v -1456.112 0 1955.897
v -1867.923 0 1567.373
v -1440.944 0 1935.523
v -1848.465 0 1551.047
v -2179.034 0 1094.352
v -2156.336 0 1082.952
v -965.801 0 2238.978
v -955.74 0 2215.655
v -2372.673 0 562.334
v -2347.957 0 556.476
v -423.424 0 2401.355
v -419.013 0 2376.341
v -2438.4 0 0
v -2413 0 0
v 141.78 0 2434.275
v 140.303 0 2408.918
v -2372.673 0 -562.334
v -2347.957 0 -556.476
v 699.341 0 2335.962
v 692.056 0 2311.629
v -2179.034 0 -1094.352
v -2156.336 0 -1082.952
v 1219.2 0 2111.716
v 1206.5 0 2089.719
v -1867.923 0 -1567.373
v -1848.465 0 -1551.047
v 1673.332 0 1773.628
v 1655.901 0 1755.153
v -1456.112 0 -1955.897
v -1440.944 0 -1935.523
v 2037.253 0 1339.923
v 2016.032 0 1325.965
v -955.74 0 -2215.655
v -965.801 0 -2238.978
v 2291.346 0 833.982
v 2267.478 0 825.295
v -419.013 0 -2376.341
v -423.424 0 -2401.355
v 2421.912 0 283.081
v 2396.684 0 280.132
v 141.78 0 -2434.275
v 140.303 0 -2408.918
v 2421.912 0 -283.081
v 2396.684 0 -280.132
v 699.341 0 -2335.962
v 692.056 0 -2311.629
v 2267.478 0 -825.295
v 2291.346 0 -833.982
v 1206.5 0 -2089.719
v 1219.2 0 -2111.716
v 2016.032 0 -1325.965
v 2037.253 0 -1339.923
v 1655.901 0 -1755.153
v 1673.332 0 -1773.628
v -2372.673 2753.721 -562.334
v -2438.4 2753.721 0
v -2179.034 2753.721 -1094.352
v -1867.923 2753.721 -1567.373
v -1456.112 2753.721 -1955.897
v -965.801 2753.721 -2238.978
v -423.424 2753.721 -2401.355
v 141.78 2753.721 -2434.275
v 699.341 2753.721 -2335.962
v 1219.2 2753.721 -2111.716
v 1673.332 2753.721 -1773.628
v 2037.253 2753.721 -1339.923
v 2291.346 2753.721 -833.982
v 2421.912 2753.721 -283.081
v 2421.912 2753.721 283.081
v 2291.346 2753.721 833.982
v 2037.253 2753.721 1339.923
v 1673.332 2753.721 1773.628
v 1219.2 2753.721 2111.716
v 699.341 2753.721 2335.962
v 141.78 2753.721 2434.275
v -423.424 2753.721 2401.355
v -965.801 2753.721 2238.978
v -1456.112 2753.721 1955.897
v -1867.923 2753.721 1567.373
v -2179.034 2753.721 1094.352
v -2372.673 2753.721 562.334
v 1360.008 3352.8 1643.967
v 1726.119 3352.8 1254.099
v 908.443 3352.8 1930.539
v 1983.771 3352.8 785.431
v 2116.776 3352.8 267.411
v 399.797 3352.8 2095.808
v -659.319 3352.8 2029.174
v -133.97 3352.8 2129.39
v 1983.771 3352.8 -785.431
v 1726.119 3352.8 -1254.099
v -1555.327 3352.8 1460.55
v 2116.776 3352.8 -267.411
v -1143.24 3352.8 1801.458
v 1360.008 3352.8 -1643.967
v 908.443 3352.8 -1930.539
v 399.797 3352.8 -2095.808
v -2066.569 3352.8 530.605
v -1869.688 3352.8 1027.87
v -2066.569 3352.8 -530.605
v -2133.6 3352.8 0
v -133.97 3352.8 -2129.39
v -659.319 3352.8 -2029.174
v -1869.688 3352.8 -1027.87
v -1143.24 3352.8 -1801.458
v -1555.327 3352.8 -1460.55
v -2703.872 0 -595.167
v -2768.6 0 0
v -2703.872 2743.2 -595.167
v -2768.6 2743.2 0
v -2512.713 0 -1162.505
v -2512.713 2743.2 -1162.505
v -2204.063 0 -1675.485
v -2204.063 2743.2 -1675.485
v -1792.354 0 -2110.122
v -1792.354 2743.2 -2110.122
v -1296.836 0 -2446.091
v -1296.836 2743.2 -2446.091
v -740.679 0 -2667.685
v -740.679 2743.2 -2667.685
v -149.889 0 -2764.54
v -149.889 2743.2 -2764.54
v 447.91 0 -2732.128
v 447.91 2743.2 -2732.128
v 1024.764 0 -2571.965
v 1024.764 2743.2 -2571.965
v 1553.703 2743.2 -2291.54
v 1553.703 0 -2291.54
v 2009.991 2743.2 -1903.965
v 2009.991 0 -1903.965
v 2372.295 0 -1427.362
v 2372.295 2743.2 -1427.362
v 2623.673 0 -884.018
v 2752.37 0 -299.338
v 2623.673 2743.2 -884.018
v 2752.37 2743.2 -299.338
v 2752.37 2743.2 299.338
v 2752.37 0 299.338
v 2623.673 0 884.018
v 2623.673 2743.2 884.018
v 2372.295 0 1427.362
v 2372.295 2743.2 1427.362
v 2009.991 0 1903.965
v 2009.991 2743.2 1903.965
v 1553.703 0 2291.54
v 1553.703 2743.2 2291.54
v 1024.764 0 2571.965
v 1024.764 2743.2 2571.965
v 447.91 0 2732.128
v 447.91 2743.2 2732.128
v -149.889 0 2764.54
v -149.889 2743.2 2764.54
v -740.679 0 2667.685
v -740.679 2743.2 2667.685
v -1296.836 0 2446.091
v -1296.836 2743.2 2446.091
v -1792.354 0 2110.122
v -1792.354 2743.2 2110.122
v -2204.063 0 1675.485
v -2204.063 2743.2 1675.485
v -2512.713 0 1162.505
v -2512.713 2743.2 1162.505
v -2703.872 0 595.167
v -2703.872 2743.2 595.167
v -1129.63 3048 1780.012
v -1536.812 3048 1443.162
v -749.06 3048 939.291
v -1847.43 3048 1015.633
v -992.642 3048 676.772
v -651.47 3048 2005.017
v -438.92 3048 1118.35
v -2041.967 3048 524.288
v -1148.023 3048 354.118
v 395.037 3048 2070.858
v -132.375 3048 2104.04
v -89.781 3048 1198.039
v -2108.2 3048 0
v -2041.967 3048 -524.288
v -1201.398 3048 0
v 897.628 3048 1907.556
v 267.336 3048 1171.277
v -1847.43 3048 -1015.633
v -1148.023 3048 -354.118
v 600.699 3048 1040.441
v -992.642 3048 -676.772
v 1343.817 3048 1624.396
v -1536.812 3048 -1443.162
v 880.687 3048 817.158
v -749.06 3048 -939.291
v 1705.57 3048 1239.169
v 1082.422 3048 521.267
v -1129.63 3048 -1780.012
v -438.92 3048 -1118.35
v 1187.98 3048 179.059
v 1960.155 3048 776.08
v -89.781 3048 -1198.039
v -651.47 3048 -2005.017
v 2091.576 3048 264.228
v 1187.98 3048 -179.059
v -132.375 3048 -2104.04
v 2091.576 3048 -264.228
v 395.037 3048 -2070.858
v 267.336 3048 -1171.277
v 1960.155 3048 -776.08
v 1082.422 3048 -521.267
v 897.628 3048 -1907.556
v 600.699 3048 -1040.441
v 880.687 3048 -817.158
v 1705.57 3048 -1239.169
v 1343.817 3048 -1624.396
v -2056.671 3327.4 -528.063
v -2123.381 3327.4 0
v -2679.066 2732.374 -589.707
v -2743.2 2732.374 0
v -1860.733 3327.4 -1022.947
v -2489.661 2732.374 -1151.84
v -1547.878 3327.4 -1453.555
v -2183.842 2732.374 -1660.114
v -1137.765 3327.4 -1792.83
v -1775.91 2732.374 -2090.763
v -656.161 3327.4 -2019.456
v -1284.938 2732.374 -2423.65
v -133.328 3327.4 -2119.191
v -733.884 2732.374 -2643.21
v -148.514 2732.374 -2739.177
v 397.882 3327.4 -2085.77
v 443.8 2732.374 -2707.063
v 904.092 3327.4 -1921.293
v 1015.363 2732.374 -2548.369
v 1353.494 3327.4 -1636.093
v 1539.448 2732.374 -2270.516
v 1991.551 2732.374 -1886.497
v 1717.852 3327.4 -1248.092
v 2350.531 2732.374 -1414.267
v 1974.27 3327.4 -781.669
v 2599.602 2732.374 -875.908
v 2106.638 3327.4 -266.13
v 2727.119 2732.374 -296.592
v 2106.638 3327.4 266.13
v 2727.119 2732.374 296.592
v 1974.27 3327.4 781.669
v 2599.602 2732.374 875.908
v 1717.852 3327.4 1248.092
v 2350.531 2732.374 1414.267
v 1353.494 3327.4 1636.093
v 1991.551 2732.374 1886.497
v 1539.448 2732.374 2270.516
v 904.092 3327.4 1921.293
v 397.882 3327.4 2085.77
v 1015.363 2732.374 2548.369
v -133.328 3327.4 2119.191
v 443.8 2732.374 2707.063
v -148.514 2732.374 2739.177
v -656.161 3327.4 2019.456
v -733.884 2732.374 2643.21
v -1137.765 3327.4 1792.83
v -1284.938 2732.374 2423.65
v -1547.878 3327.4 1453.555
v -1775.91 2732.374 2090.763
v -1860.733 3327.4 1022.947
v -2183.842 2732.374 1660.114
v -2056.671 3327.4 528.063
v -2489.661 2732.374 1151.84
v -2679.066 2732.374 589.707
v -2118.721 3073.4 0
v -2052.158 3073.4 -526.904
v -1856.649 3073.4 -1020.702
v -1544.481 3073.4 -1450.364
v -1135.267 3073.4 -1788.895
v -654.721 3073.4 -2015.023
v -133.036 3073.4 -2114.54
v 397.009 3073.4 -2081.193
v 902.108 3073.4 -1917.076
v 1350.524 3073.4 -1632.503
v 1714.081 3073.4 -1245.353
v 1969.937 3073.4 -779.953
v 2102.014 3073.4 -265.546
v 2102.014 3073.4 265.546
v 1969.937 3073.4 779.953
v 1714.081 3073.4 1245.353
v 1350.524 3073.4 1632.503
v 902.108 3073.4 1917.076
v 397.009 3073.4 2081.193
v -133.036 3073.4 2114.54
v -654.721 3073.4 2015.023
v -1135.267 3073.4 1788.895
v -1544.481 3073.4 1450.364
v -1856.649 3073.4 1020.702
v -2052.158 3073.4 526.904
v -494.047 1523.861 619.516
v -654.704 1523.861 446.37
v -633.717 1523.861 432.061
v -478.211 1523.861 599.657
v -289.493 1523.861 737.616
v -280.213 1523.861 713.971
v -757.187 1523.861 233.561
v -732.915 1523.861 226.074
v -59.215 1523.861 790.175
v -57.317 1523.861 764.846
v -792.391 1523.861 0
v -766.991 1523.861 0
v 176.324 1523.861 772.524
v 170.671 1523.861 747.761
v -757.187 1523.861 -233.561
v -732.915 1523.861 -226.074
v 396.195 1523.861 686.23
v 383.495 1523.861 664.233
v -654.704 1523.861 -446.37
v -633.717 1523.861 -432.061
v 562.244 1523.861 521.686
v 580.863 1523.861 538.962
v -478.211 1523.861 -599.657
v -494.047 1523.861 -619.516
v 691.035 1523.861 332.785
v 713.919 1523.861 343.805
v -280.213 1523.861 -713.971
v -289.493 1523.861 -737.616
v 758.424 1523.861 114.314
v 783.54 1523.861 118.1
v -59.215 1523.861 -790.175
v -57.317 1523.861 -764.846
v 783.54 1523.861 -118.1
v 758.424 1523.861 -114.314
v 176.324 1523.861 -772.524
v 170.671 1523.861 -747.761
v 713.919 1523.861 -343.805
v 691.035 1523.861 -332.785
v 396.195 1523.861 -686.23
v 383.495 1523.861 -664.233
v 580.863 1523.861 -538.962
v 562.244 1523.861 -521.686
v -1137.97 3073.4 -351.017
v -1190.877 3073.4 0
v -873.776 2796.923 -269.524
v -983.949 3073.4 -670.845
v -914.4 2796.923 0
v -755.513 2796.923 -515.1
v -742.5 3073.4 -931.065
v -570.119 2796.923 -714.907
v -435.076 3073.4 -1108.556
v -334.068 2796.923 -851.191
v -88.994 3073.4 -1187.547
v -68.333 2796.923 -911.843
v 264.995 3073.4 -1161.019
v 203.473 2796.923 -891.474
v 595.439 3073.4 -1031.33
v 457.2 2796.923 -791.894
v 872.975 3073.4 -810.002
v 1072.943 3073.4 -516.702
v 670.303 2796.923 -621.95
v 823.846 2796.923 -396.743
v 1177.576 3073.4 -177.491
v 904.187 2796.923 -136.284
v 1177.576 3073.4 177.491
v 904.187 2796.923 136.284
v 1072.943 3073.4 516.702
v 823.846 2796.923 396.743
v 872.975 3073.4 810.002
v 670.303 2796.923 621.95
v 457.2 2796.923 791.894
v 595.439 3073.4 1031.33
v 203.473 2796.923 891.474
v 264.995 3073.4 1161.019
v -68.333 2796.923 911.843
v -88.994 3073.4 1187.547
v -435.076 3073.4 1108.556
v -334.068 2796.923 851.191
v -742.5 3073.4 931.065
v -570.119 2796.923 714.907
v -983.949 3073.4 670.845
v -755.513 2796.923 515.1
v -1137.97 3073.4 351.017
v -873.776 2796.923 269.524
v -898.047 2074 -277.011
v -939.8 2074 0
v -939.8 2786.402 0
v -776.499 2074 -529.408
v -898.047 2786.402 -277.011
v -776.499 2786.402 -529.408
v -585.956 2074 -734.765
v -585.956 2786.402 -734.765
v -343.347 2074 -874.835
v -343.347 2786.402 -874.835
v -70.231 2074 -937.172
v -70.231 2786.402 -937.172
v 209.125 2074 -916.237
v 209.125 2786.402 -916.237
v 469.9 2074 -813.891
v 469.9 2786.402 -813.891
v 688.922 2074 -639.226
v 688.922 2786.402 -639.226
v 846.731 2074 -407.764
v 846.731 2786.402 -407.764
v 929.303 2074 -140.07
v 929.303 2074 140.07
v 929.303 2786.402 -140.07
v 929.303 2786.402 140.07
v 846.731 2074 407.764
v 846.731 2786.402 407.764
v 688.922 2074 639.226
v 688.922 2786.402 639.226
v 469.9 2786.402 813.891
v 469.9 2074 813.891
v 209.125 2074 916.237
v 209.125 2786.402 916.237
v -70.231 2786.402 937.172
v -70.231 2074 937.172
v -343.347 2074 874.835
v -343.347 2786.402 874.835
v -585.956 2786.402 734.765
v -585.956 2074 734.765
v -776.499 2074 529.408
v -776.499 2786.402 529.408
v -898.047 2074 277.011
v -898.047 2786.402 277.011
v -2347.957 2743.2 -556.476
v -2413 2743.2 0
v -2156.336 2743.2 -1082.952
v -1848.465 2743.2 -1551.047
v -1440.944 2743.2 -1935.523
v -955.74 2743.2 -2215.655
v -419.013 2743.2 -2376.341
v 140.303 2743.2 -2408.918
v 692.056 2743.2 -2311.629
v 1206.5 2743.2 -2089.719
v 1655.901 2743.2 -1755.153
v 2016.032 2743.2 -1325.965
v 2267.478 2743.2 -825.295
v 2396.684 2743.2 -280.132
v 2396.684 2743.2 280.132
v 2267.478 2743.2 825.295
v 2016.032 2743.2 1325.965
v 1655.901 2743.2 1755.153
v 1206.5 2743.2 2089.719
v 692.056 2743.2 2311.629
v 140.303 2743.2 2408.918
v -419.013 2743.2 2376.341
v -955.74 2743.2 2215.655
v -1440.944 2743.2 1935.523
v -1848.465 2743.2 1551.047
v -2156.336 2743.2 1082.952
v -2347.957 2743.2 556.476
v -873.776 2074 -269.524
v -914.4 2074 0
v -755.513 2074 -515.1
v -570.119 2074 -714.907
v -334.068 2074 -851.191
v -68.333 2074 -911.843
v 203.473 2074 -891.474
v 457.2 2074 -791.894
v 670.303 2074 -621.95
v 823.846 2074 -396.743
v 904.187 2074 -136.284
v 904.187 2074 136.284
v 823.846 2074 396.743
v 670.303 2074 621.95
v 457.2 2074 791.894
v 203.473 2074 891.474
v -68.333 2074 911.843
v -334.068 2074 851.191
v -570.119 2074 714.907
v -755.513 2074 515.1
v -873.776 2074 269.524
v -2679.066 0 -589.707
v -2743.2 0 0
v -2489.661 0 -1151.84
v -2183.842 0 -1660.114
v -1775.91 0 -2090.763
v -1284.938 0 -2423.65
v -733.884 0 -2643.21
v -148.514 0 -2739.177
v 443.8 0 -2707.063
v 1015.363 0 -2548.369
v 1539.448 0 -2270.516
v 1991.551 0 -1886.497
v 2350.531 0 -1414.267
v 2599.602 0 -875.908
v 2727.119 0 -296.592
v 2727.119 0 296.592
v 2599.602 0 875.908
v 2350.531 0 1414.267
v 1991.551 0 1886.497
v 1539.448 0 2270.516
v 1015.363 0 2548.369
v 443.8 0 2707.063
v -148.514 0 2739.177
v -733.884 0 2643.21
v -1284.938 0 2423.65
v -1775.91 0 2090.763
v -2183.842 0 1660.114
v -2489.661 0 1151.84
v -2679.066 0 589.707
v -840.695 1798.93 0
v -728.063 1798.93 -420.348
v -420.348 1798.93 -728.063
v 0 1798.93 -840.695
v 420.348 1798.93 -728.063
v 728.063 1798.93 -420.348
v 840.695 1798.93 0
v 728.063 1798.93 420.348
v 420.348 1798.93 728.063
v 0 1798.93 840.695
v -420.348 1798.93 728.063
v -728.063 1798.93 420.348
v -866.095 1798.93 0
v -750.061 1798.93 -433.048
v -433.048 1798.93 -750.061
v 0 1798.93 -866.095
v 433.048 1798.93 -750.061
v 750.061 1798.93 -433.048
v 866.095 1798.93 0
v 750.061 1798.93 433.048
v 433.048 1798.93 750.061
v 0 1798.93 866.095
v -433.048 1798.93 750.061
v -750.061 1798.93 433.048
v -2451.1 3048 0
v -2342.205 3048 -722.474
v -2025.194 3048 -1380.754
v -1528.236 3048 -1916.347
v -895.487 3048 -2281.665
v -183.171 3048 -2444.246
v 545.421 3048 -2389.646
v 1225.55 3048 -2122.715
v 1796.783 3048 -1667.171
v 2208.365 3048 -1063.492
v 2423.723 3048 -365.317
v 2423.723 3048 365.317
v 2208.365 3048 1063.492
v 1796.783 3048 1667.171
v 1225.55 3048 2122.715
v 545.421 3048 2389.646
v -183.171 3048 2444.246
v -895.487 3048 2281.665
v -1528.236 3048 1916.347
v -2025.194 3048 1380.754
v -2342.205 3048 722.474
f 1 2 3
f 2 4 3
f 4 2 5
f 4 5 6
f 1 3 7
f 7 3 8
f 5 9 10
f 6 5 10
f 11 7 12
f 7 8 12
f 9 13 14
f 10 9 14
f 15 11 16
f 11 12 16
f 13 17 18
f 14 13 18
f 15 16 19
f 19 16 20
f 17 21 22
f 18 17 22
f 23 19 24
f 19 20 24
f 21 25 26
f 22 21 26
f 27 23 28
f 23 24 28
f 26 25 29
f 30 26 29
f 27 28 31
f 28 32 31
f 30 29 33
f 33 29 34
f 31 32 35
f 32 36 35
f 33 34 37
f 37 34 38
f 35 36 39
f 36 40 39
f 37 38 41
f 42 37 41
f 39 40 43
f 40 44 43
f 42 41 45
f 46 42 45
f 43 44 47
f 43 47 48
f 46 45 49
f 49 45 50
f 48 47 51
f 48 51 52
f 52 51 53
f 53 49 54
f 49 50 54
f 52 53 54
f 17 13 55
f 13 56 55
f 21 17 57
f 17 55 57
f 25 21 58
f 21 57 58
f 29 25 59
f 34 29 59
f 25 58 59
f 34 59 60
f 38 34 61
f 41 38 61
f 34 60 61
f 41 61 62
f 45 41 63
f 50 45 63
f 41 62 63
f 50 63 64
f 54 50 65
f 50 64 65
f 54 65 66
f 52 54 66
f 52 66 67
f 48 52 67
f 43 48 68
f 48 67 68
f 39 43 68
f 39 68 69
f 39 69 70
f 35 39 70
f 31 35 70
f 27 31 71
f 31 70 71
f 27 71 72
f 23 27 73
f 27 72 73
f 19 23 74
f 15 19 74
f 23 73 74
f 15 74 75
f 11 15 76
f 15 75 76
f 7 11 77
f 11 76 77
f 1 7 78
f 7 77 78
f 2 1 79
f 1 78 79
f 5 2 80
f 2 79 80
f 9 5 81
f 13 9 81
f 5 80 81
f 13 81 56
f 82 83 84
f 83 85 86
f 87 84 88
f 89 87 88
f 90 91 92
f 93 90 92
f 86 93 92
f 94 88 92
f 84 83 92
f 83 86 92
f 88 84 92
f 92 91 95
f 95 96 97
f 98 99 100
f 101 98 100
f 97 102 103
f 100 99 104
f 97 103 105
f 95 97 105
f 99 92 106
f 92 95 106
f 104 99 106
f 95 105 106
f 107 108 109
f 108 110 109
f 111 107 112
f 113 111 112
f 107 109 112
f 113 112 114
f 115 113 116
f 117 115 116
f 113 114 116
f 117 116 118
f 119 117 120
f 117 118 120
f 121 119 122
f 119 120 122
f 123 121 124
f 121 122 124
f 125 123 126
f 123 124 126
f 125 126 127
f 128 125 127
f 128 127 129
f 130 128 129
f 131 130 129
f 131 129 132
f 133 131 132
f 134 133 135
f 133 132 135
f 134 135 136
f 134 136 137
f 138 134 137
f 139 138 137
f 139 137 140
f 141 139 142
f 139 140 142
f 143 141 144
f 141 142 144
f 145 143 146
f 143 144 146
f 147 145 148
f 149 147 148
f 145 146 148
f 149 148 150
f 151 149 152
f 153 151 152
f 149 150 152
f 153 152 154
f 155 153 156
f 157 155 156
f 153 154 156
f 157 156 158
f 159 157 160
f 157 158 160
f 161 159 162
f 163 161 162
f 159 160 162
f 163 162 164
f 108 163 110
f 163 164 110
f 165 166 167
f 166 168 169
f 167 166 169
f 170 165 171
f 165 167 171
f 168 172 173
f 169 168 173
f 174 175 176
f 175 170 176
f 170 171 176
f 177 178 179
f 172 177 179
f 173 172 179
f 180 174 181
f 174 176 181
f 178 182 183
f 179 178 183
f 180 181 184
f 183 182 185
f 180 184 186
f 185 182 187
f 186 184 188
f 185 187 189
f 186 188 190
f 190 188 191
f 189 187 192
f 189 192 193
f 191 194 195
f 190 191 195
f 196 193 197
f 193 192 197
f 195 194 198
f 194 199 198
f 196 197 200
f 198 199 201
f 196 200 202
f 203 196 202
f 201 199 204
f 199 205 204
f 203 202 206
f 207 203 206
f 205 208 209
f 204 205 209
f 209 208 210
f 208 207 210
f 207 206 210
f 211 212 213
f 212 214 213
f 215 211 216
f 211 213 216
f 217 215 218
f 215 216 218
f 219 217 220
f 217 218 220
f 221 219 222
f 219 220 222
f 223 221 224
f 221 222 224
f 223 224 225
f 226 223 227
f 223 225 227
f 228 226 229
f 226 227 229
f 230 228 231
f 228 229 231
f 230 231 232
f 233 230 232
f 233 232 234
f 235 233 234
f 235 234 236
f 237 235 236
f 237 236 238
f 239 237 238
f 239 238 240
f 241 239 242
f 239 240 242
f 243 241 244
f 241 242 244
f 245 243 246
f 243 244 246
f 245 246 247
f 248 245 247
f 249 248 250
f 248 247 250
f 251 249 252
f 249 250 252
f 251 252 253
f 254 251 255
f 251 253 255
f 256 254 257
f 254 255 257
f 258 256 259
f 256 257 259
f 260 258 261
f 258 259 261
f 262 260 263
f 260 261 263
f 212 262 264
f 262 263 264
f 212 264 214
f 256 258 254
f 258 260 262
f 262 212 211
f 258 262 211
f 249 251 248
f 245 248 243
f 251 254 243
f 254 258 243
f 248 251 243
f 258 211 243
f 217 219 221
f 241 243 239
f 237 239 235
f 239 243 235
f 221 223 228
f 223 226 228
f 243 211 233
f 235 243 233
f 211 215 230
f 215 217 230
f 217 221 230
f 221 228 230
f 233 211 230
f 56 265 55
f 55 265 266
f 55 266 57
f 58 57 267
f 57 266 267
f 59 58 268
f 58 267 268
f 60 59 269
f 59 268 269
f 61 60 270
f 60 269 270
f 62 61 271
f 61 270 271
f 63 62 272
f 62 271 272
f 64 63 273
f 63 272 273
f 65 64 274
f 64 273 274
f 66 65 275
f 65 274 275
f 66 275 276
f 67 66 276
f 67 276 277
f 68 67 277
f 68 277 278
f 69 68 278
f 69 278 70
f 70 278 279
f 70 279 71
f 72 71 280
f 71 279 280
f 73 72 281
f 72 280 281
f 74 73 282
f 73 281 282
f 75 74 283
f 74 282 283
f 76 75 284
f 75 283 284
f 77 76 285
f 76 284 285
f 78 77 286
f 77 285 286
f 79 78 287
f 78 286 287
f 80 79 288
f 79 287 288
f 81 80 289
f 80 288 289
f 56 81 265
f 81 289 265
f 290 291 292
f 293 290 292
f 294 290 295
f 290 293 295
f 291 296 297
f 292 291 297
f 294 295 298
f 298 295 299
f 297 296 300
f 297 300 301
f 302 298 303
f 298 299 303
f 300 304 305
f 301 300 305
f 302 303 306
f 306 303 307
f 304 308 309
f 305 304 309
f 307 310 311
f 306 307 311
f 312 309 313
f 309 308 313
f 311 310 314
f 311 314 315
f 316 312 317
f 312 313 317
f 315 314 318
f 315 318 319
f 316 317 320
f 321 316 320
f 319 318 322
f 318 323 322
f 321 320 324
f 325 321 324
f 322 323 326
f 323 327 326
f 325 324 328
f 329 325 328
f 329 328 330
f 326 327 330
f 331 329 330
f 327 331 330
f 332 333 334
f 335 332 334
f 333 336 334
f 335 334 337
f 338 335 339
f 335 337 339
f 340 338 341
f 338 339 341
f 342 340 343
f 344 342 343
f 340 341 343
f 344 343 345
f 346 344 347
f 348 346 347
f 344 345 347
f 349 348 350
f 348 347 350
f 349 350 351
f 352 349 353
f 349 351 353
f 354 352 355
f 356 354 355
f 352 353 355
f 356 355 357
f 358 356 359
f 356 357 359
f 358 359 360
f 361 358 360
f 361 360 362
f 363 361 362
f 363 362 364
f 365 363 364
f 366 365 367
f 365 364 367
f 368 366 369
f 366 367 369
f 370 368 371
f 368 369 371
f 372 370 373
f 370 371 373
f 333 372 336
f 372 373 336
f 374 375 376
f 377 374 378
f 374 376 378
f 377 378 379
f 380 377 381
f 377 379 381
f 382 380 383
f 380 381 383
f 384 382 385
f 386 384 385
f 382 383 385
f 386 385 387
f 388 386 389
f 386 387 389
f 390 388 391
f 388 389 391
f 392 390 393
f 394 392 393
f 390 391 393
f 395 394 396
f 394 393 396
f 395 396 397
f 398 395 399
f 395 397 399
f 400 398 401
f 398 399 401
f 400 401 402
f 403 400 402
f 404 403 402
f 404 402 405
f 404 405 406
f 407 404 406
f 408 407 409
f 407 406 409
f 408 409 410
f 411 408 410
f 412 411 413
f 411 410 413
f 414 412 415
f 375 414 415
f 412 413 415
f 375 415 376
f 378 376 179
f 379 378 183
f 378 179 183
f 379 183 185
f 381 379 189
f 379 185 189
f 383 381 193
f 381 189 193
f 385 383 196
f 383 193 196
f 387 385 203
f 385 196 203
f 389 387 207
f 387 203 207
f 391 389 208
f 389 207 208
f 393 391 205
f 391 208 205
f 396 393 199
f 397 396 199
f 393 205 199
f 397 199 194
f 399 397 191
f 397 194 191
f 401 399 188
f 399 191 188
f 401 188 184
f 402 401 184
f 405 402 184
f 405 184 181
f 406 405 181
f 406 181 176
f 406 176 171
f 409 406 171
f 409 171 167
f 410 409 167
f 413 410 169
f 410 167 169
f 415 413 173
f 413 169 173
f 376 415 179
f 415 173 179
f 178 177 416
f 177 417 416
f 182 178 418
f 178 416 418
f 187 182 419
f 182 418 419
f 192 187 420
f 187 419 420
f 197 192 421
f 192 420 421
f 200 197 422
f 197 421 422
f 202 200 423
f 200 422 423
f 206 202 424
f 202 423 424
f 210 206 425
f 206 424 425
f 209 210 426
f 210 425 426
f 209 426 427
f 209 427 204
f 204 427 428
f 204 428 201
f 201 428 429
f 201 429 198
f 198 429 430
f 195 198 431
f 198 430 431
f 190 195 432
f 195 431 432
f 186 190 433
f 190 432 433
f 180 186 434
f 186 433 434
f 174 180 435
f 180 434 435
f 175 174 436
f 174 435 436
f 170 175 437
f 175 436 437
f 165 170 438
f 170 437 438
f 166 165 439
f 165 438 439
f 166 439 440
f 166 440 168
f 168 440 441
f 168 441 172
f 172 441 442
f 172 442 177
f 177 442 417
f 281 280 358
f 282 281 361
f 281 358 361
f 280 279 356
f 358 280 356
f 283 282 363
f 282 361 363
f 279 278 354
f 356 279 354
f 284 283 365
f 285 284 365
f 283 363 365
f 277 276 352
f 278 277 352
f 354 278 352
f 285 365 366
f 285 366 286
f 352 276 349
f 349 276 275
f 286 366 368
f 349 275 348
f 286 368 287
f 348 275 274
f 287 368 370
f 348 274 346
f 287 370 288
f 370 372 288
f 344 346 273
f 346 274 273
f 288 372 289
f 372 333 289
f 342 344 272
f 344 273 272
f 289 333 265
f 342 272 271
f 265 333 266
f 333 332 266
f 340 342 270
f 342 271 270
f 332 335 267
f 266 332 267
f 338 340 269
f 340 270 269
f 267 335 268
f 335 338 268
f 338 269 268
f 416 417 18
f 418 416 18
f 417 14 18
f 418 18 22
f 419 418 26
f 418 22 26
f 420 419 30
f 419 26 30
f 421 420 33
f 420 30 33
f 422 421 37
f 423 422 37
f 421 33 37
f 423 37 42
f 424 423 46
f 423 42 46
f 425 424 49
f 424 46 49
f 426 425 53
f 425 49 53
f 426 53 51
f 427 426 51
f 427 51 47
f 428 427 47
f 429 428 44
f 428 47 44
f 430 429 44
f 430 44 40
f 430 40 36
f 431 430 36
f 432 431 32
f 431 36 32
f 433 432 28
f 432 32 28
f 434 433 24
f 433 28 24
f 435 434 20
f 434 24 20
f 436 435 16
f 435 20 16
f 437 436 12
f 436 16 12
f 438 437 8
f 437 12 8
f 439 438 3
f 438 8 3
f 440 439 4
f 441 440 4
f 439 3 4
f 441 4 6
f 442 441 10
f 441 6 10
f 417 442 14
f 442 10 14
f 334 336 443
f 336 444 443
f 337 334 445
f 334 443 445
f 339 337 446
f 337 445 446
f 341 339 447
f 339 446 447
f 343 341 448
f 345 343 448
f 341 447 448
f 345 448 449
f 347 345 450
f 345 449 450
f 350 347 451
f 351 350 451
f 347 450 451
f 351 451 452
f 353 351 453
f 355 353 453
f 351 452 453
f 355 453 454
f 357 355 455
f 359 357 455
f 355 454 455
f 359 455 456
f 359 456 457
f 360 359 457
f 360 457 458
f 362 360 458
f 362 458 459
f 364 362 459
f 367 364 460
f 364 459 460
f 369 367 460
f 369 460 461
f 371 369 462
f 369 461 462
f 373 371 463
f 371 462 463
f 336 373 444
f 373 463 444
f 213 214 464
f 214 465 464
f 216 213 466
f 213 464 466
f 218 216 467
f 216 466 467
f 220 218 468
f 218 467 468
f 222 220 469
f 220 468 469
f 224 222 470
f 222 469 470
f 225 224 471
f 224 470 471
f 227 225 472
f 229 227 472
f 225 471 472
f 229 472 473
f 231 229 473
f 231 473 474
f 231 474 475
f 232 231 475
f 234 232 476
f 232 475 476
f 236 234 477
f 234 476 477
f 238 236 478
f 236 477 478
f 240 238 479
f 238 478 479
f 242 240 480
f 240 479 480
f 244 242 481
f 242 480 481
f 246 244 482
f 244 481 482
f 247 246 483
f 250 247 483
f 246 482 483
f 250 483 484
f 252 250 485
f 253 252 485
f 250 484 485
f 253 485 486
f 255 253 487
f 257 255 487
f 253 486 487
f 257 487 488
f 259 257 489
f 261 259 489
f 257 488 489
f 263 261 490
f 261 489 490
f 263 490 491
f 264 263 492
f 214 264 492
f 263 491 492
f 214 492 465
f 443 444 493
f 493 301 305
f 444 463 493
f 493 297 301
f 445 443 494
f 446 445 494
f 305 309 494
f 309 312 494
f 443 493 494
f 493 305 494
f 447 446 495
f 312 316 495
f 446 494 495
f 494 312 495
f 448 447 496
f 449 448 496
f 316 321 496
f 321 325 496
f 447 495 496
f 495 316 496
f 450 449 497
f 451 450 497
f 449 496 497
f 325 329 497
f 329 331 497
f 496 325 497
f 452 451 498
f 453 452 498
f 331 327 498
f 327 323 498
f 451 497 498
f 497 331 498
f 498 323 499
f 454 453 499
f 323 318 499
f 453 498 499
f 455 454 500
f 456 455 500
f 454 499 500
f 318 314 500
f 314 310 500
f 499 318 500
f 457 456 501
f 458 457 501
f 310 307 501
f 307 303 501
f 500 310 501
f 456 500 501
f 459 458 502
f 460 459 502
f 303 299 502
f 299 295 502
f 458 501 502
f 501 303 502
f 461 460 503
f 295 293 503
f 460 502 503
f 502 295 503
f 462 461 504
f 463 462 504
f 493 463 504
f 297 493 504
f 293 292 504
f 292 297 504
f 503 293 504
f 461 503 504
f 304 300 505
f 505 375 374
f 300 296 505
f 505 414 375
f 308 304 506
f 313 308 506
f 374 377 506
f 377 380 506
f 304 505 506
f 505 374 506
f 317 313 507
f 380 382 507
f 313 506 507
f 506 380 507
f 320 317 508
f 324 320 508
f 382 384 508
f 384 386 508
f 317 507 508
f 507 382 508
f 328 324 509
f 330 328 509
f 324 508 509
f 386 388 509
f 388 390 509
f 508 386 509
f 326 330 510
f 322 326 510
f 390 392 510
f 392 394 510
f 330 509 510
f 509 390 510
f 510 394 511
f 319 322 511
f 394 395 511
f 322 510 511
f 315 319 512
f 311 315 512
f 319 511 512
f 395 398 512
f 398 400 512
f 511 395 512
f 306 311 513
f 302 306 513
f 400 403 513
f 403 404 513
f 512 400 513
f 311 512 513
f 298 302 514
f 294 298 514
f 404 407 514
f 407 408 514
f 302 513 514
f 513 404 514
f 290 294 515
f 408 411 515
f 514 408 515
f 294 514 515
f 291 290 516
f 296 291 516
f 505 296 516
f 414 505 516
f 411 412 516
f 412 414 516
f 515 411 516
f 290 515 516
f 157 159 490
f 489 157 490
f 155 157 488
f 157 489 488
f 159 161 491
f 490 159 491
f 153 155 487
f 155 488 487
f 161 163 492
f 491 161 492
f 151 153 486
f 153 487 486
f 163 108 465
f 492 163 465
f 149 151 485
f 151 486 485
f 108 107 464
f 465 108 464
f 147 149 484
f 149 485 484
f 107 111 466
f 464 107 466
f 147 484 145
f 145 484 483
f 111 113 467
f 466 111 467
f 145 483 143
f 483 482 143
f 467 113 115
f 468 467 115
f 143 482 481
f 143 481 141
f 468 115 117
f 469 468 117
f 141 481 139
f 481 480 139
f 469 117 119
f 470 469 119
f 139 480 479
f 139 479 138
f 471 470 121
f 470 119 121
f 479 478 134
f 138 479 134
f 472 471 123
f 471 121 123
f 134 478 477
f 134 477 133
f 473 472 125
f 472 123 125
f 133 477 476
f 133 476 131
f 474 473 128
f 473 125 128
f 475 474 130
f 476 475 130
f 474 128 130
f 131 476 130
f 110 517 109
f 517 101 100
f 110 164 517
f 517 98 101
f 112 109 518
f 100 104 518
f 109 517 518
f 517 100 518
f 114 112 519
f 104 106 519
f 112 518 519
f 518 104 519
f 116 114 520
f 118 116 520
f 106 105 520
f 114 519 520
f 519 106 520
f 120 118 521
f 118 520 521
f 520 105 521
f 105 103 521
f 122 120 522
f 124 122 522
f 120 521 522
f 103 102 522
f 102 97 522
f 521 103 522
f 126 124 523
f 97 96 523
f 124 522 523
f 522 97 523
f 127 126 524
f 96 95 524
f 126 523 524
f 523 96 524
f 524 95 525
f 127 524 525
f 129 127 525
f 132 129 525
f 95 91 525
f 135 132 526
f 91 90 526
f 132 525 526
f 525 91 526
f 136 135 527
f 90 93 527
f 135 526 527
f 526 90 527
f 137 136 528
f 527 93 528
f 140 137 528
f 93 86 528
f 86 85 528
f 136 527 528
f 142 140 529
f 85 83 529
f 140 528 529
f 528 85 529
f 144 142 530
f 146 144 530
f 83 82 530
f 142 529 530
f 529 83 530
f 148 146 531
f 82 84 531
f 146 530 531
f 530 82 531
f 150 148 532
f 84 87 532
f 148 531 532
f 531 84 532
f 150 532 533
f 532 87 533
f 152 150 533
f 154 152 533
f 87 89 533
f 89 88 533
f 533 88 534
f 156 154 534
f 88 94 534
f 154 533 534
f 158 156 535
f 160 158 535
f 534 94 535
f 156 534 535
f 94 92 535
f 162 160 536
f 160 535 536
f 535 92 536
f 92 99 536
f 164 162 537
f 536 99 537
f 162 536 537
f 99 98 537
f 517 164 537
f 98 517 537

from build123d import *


with BuildPart() as part:
    # Sketch1 → Revolve1 (revolve)
    with BuildSketch(Plane.XY):
        Polygon((-2438.4, 0), (-2438.4, 2753.721024484), (-2118.721024484, 3073.4), (-1190.8772065, 3073.4), (-914.4, 2796.9227935), (-914.4, 2074), (-766.990618326, 1523.86069808), (-792.390618326, 1523.86069808), (-939.8, 2074), (-939.8, 2786.401769016), (-1201.398230984, 3048), (-2108.2, 3048), (-2413, 2743.2), (-2413, 0), align=None)
    revolve(axis=Axis((0, 3520.44, 0), (0, -1, 0)))


with BuildPart() as body_2:
    # Sketch2 → Revolve2 (revolve)
    with BuildSketch(Plane.XY):
        Polygon((-2743.2, 0), (-2768.6, 0), (-2768.6, 2743.2), (-2133.6, 3352.8), (0, 3352.8), (0, 3327.4), (-2123.381318695, 3327.4), (-2743.2, 2732.374065947), align=None)
    revolve(axis=Axis((0, 3520.44, 0), (0, -1, 0)))


solid = Compound([part.part, body_2.part])
